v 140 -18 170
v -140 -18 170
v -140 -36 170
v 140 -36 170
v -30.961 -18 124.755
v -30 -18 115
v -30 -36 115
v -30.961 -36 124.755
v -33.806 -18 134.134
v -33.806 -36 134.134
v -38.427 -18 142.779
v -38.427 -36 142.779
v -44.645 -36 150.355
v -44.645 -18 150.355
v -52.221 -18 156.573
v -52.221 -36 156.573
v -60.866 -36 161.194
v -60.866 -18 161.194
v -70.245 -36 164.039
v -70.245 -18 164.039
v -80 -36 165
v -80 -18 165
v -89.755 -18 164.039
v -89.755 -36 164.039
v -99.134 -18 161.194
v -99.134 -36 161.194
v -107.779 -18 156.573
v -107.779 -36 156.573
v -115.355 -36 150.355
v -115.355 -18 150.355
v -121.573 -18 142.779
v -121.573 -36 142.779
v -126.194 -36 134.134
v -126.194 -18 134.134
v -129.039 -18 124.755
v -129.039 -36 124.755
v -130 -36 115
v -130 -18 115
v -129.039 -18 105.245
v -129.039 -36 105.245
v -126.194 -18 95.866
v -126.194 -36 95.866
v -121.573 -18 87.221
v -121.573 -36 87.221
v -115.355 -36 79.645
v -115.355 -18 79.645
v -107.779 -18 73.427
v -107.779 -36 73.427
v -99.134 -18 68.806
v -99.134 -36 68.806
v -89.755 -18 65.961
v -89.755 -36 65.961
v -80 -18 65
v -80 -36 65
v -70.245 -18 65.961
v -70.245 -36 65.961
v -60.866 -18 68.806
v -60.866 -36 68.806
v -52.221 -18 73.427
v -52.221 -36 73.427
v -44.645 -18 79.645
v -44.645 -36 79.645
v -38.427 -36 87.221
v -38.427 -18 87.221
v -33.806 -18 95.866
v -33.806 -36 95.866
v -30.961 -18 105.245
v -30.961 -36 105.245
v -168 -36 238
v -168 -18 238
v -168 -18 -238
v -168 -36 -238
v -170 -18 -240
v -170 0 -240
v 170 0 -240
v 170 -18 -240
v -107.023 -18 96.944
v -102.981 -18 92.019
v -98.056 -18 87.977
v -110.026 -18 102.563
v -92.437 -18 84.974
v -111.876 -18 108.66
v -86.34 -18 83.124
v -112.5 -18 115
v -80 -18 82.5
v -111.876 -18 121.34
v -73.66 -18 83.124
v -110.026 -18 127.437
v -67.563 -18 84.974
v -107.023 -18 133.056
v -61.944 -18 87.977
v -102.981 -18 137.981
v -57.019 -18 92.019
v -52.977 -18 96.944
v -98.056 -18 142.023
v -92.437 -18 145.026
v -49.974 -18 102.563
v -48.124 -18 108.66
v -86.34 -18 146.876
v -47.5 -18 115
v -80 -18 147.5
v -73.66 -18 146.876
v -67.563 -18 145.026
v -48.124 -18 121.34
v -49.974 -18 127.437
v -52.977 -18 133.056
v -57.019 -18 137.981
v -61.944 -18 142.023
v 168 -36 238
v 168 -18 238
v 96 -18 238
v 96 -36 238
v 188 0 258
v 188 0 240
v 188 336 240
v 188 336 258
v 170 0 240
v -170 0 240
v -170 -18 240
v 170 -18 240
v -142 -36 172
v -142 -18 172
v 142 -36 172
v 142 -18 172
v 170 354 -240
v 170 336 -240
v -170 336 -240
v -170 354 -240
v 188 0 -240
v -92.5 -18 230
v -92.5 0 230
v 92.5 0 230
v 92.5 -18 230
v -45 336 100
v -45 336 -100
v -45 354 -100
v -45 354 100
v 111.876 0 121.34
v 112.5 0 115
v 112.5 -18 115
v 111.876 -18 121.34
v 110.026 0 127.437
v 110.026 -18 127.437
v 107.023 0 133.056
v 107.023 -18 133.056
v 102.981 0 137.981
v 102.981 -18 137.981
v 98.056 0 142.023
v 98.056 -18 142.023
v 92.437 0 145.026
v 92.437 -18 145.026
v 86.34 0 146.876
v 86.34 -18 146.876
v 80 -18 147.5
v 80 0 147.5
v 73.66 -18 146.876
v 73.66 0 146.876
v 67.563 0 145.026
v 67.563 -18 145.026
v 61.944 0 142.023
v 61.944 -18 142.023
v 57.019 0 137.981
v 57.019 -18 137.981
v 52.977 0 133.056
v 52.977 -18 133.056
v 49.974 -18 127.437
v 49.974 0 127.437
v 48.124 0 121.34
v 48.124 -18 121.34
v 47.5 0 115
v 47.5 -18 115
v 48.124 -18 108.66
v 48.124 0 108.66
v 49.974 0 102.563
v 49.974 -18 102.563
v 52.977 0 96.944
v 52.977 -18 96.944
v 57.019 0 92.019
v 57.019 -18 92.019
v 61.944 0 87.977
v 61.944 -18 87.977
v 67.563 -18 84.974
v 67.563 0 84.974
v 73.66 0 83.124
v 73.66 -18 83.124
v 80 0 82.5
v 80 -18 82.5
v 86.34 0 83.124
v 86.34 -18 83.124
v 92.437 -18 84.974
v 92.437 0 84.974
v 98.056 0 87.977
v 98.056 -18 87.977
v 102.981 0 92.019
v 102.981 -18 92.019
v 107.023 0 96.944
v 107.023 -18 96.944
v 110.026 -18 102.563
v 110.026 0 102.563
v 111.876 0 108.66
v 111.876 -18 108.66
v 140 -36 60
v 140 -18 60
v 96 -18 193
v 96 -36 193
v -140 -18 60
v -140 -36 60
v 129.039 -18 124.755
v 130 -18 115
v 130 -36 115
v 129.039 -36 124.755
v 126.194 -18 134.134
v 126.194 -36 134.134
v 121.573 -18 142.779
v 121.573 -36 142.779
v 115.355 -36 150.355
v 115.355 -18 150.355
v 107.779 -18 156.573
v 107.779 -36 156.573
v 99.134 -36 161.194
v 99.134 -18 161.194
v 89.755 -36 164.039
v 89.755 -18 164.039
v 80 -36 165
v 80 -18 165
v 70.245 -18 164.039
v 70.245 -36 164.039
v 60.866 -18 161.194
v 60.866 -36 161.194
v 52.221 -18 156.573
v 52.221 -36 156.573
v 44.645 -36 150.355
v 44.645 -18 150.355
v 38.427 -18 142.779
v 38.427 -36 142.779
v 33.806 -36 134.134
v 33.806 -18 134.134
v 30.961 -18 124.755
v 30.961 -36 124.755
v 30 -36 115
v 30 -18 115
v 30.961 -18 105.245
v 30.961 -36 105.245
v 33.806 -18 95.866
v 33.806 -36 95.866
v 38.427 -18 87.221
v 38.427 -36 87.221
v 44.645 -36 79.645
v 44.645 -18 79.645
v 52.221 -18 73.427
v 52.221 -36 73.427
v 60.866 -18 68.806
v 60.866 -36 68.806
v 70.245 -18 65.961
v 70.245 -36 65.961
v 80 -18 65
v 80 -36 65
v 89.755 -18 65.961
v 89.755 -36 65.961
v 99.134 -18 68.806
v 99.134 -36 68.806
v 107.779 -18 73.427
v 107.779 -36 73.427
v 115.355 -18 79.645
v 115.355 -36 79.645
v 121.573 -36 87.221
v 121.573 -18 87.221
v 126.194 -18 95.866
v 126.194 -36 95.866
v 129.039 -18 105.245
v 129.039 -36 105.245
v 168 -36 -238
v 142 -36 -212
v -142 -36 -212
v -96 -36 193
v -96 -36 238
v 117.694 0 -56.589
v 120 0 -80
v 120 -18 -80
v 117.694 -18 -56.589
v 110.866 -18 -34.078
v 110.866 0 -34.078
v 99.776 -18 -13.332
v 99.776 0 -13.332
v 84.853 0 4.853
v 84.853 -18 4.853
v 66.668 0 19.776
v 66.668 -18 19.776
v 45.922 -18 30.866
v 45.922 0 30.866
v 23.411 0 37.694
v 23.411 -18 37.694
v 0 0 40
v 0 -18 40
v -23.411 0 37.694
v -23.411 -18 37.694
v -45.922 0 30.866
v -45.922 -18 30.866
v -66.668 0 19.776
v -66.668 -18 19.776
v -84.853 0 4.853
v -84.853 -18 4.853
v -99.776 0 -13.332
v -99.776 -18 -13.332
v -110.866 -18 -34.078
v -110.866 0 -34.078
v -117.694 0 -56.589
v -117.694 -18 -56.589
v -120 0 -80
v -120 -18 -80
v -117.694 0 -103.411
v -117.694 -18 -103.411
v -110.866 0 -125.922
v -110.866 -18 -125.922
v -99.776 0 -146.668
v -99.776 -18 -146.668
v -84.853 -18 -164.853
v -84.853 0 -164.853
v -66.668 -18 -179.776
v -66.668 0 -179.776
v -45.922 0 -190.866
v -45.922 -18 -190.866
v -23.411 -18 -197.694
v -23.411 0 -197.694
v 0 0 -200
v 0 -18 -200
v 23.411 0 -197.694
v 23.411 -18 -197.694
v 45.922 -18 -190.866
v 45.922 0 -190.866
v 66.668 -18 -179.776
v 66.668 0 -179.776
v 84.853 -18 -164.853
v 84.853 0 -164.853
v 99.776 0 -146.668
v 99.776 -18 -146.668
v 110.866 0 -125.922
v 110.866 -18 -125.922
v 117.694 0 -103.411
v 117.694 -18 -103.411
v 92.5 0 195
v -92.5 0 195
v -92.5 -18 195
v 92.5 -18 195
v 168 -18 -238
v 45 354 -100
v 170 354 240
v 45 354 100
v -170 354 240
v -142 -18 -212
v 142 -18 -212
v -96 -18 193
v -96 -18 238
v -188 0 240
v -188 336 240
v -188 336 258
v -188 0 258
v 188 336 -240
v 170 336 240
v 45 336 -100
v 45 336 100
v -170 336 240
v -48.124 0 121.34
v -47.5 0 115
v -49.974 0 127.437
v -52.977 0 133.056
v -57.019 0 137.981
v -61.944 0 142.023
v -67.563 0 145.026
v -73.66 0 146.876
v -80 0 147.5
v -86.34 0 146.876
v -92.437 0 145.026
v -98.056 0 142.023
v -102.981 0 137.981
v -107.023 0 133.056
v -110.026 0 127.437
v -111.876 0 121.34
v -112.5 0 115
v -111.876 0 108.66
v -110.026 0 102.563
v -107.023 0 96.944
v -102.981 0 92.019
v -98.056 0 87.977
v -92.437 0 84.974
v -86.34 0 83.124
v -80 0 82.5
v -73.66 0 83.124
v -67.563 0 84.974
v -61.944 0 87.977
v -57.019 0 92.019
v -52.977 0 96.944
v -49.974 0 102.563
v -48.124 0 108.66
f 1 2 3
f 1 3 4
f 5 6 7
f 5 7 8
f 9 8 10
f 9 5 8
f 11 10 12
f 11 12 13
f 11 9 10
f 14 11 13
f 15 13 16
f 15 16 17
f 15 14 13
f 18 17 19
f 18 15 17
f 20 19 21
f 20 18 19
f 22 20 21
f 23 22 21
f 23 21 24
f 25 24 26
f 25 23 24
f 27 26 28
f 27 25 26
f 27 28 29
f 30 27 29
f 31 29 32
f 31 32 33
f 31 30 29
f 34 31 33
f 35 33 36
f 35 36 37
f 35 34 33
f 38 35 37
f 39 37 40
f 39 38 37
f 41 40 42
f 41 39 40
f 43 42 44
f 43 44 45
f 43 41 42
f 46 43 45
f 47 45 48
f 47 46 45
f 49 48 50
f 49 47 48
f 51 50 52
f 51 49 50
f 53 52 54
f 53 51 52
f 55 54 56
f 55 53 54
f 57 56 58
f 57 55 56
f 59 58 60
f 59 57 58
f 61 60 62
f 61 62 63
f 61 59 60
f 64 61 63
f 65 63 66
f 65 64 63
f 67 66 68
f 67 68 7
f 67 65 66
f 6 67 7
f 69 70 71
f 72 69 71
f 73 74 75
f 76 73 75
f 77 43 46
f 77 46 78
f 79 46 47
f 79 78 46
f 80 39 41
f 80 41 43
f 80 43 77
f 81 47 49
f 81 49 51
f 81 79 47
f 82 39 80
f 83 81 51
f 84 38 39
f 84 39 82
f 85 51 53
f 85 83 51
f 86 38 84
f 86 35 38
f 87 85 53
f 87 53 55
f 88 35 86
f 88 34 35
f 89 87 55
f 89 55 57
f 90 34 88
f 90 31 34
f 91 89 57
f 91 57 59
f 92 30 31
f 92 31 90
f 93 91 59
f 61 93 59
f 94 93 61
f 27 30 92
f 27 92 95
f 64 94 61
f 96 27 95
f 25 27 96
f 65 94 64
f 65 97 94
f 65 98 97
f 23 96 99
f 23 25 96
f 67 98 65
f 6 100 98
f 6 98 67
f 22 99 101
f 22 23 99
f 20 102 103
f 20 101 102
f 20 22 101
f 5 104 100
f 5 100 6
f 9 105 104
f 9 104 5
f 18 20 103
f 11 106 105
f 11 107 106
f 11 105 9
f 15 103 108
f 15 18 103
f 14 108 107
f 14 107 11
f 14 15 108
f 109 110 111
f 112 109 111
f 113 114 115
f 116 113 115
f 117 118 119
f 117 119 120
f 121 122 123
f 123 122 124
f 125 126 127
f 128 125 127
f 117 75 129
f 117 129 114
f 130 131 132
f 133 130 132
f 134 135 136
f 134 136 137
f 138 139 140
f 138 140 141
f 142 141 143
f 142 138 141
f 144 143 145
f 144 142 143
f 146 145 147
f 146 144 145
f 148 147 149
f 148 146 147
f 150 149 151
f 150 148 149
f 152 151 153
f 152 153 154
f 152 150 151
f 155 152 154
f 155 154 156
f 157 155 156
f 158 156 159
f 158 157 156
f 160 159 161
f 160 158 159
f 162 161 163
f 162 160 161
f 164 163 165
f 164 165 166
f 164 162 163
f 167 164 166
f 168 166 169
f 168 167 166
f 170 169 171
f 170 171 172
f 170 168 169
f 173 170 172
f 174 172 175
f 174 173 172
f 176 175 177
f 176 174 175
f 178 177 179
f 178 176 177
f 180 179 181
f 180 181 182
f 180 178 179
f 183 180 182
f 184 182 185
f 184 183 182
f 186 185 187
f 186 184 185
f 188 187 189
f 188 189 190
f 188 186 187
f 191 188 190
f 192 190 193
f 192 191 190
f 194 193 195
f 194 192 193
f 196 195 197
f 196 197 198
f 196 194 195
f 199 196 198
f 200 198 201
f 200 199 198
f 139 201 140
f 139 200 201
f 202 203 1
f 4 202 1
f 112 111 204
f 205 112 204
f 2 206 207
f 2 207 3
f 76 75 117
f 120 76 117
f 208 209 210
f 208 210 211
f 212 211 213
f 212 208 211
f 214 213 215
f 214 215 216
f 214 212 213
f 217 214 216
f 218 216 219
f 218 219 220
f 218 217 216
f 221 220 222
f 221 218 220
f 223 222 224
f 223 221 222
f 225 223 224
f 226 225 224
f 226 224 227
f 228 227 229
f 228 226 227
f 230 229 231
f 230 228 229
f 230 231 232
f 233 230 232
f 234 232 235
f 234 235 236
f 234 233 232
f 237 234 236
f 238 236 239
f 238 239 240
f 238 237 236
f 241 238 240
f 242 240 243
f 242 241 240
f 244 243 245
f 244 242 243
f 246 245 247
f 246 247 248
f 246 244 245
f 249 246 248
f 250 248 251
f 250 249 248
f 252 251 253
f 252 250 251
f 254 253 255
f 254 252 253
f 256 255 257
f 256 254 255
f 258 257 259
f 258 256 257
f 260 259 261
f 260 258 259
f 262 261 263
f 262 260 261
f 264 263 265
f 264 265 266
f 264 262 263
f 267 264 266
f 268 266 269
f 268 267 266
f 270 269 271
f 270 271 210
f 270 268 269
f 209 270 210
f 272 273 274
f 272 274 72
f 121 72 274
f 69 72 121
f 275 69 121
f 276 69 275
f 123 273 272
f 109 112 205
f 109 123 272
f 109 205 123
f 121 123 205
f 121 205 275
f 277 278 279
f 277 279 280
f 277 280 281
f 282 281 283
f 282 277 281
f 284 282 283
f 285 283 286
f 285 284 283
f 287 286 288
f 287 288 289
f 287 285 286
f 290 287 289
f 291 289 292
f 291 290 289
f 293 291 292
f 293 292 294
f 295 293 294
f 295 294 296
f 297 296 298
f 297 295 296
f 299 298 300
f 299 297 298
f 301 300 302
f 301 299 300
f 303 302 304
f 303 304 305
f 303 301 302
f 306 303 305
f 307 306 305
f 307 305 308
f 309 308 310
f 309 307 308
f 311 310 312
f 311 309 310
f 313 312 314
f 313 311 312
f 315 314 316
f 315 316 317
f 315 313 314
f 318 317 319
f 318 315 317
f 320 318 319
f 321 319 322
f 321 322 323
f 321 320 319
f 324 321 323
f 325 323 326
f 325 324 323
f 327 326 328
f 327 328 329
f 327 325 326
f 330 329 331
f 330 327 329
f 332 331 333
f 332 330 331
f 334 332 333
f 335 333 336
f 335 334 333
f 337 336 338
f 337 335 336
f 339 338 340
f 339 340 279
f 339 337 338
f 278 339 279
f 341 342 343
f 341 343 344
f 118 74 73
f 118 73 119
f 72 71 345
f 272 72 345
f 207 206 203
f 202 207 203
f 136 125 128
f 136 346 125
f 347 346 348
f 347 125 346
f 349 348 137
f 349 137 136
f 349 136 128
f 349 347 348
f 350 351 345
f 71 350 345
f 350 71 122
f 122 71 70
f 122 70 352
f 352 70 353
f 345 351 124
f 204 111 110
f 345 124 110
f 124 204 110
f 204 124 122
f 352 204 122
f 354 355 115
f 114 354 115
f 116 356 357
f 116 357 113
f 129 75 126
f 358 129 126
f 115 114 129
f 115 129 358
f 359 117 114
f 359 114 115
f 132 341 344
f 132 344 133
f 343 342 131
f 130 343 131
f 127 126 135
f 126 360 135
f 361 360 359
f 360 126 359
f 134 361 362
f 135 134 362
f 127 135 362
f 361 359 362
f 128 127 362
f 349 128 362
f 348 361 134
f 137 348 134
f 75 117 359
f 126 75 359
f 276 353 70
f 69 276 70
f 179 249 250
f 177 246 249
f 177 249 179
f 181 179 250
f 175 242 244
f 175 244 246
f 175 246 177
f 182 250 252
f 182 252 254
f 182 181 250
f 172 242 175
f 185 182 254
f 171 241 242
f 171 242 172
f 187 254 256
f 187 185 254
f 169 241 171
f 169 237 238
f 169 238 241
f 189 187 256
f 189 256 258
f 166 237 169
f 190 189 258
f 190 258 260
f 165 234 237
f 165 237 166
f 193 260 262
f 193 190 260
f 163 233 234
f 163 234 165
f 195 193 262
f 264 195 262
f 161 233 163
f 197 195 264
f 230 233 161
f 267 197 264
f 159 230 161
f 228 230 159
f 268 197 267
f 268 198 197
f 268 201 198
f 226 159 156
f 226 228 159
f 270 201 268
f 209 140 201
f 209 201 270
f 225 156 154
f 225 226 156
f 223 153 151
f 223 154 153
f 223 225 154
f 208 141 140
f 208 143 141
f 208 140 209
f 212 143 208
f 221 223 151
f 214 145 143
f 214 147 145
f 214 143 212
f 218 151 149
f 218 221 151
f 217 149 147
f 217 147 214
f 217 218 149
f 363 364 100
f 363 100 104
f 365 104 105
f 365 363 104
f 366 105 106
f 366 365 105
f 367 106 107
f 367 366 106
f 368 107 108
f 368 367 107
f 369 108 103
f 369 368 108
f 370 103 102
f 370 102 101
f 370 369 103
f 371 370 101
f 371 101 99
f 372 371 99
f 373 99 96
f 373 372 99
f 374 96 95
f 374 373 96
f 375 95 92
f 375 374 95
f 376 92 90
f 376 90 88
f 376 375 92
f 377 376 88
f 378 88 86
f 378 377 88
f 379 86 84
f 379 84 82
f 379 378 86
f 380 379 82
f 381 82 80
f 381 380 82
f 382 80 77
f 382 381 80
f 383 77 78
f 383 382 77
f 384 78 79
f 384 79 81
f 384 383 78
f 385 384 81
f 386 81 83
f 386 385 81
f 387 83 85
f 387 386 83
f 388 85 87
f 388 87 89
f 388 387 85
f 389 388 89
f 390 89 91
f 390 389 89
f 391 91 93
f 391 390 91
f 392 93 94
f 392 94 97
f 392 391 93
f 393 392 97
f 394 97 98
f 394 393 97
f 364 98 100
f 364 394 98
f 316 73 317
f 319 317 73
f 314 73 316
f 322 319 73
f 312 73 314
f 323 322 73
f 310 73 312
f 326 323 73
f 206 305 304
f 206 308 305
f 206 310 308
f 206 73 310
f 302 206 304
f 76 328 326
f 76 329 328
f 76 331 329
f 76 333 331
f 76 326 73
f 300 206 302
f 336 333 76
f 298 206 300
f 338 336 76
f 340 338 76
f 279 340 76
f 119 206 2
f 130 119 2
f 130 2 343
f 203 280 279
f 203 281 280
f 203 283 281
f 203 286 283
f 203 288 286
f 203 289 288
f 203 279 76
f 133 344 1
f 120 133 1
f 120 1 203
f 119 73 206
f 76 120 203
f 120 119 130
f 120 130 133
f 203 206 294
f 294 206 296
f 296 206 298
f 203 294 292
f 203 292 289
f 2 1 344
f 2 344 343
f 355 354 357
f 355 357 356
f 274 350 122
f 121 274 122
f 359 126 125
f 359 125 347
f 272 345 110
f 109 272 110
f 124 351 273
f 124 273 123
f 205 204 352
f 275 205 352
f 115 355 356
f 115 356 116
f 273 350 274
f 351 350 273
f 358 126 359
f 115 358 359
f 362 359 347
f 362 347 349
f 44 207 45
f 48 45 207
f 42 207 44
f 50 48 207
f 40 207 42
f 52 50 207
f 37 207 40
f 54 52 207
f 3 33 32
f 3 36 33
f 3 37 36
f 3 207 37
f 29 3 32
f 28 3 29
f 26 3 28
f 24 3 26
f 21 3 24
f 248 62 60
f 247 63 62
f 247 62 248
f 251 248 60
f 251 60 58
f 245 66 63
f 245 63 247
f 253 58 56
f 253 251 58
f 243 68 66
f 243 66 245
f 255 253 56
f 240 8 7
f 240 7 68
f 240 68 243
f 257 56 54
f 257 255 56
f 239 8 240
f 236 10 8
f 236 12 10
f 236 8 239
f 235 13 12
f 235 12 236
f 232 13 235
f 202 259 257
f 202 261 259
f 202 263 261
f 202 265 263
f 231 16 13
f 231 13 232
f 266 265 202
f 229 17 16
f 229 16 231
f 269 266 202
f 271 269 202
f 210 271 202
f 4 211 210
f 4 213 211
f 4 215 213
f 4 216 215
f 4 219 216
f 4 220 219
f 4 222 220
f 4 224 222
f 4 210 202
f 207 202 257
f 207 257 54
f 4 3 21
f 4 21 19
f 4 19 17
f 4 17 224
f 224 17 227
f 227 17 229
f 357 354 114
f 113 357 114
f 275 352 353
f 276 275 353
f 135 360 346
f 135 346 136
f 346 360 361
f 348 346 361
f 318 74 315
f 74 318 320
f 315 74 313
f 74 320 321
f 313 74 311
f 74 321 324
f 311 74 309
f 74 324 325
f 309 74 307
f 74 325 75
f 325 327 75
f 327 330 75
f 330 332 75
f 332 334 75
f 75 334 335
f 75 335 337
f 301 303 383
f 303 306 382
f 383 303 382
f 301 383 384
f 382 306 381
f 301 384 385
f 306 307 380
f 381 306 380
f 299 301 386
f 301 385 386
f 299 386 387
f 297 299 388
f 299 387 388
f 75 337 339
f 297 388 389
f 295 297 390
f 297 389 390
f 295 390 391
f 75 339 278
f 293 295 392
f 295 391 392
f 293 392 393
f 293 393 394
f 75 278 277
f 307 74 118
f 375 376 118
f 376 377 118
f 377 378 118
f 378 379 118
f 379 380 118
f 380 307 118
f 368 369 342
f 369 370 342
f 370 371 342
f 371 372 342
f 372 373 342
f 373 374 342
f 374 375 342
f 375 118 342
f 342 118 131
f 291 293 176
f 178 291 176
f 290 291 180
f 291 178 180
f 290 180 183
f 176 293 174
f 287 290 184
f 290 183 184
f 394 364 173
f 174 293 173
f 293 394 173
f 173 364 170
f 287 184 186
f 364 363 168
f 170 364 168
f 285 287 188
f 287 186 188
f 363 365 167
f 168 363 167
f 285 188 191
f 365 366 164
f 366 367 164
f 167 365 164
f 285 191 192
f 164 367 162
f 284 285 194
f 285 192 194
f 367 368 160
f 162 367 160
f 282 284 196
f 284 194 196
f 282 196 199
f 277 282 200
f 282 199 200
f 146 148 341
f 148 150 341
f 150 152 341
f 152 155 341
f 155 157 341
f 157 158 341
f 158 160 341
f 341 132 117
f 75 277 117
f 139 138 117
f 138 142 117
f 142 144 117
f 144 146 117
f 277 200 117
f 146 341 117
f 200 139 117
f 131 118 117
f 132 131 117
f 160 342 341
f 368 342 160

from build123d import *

# Parameters (mm, degrees)
F0_W      = 340
F0_H      = 480
F0_R      = 120
F0_R_2    = 32.5
F0_W_2    = 185
F0_H_2    = 35
F1_DEPTH  = 18
F2_W      = 280
F2_H      = 110
F2_R      = 50
F3_DEPTH  = 18
F4_W      = 284
F4_H      = 384
F5_DEPTH  = 18
F6_W      = 336
F6_H      = 480
F7_DEPTH  = 18
F8_W      = 340
F8_H      = 480
F9_DEPTH  = 18
F11_W     = 340
F11_H     = 480
F11_W_2   = 90
F11_H_2   = 200
F12_DEPTH = 18
F13_W     = 376
F13_H     = 336
F14_DEPTH = 18


with BuildPart() as f1:
    # F0 (on Front) → F1 (new body)
    with BuildSketch(Plane.XZ):
        Rectangle(F0_W, F0_H)
        with Locations((0, -80)):
            Circle(F0_R, mode=Mode.SUBTRACT)
        with Locations((-80, 115)):
            Circle(F0_R_2, mode=Mode.SUBTRACT)
        with Locations((80, 115)):
            Circle(F0_R_2, mode=Mode.SUBTRACT)
        with Locations((0, 212.5)):
            Rectangle(F0_W_2, F0_H_2, mode=Mode.SUBTRACT)
    extrude(amount=F1_DEPTH)

    # F2 (on face) → F3 (join)
    with BuildSketch(Plane.XZ.offset(18)):
        with Locations((0, 115)):
            Rectangle(F2_W, F2_H)
        with Locations((-80, 115)):
            Circle(F2_R, mode=Mode.SUBTRACT)
        with Locations((80, 115)):
            Circle(F2_R, mode=Mode.SUBTRACT)
    extrude(amount=F3_DEPTH)


with BuildPart() as f5:
    # F4 (on face) → F5 (new body)
    with BuildSketch(Plane.XZ.offset(18)):
        Polygon((-168, 238), (-168, -238), (168, -238), (168, 238), (96, 238), (96, 193), (-96, 193), (-96, 238), align=None)
        with Locations((0, -20)):
            Rectangle(F4_W, F4_H, mode=Mode.SUBTRACT)
    extrude(amount=F5_DEPTH)


with BuildPart() as f7:
    # F6 (on face) → F7 (new body)
    with BuildSketch(Plane.YZ.offset(170)):
        with Locations((168, 0)):
            Rectangle(F6_W, F6_H)
    extrude(amount=F7_DEPTH)


with BuildPart() as f9:
    # F8 (on face) → F9 (new body)
    with BuildSketch(Plane(origin=(0, 0, 0), x_dir=(-1, 0, 0), z_dir=(0, 1, 0))):
        Rectangle(F8_W, F8_H)
    extrude(amount=F9_DEPTH)


with BuildPart() as f12:
    # F11 (on face) → F12 (new body)
    with BuildSketch(Plane(origin=(0, 336, 0), x_dir=(-1, 0, 0), z_dir=(0, 1, 0))):
        Rectangle(F11_W, F11_H)
        Rectangle(F11_W_2, F11_H_2, mode=Mode.SUBTRACT)
    extrude(amount=F12_DEPTH)


with BuildPart() as f14:
    # F13 (on face) → F14 (new body)
    with BuildSketch(Plane.XY.offset(240)):
        with Locations((0, 168)):
            Rectangle(F13_W, F13_H)
    extrude(amount=F14_DEPTH)


solid = Compound([f1.part, f5.part, f7.part, f12.part, f14.part])
